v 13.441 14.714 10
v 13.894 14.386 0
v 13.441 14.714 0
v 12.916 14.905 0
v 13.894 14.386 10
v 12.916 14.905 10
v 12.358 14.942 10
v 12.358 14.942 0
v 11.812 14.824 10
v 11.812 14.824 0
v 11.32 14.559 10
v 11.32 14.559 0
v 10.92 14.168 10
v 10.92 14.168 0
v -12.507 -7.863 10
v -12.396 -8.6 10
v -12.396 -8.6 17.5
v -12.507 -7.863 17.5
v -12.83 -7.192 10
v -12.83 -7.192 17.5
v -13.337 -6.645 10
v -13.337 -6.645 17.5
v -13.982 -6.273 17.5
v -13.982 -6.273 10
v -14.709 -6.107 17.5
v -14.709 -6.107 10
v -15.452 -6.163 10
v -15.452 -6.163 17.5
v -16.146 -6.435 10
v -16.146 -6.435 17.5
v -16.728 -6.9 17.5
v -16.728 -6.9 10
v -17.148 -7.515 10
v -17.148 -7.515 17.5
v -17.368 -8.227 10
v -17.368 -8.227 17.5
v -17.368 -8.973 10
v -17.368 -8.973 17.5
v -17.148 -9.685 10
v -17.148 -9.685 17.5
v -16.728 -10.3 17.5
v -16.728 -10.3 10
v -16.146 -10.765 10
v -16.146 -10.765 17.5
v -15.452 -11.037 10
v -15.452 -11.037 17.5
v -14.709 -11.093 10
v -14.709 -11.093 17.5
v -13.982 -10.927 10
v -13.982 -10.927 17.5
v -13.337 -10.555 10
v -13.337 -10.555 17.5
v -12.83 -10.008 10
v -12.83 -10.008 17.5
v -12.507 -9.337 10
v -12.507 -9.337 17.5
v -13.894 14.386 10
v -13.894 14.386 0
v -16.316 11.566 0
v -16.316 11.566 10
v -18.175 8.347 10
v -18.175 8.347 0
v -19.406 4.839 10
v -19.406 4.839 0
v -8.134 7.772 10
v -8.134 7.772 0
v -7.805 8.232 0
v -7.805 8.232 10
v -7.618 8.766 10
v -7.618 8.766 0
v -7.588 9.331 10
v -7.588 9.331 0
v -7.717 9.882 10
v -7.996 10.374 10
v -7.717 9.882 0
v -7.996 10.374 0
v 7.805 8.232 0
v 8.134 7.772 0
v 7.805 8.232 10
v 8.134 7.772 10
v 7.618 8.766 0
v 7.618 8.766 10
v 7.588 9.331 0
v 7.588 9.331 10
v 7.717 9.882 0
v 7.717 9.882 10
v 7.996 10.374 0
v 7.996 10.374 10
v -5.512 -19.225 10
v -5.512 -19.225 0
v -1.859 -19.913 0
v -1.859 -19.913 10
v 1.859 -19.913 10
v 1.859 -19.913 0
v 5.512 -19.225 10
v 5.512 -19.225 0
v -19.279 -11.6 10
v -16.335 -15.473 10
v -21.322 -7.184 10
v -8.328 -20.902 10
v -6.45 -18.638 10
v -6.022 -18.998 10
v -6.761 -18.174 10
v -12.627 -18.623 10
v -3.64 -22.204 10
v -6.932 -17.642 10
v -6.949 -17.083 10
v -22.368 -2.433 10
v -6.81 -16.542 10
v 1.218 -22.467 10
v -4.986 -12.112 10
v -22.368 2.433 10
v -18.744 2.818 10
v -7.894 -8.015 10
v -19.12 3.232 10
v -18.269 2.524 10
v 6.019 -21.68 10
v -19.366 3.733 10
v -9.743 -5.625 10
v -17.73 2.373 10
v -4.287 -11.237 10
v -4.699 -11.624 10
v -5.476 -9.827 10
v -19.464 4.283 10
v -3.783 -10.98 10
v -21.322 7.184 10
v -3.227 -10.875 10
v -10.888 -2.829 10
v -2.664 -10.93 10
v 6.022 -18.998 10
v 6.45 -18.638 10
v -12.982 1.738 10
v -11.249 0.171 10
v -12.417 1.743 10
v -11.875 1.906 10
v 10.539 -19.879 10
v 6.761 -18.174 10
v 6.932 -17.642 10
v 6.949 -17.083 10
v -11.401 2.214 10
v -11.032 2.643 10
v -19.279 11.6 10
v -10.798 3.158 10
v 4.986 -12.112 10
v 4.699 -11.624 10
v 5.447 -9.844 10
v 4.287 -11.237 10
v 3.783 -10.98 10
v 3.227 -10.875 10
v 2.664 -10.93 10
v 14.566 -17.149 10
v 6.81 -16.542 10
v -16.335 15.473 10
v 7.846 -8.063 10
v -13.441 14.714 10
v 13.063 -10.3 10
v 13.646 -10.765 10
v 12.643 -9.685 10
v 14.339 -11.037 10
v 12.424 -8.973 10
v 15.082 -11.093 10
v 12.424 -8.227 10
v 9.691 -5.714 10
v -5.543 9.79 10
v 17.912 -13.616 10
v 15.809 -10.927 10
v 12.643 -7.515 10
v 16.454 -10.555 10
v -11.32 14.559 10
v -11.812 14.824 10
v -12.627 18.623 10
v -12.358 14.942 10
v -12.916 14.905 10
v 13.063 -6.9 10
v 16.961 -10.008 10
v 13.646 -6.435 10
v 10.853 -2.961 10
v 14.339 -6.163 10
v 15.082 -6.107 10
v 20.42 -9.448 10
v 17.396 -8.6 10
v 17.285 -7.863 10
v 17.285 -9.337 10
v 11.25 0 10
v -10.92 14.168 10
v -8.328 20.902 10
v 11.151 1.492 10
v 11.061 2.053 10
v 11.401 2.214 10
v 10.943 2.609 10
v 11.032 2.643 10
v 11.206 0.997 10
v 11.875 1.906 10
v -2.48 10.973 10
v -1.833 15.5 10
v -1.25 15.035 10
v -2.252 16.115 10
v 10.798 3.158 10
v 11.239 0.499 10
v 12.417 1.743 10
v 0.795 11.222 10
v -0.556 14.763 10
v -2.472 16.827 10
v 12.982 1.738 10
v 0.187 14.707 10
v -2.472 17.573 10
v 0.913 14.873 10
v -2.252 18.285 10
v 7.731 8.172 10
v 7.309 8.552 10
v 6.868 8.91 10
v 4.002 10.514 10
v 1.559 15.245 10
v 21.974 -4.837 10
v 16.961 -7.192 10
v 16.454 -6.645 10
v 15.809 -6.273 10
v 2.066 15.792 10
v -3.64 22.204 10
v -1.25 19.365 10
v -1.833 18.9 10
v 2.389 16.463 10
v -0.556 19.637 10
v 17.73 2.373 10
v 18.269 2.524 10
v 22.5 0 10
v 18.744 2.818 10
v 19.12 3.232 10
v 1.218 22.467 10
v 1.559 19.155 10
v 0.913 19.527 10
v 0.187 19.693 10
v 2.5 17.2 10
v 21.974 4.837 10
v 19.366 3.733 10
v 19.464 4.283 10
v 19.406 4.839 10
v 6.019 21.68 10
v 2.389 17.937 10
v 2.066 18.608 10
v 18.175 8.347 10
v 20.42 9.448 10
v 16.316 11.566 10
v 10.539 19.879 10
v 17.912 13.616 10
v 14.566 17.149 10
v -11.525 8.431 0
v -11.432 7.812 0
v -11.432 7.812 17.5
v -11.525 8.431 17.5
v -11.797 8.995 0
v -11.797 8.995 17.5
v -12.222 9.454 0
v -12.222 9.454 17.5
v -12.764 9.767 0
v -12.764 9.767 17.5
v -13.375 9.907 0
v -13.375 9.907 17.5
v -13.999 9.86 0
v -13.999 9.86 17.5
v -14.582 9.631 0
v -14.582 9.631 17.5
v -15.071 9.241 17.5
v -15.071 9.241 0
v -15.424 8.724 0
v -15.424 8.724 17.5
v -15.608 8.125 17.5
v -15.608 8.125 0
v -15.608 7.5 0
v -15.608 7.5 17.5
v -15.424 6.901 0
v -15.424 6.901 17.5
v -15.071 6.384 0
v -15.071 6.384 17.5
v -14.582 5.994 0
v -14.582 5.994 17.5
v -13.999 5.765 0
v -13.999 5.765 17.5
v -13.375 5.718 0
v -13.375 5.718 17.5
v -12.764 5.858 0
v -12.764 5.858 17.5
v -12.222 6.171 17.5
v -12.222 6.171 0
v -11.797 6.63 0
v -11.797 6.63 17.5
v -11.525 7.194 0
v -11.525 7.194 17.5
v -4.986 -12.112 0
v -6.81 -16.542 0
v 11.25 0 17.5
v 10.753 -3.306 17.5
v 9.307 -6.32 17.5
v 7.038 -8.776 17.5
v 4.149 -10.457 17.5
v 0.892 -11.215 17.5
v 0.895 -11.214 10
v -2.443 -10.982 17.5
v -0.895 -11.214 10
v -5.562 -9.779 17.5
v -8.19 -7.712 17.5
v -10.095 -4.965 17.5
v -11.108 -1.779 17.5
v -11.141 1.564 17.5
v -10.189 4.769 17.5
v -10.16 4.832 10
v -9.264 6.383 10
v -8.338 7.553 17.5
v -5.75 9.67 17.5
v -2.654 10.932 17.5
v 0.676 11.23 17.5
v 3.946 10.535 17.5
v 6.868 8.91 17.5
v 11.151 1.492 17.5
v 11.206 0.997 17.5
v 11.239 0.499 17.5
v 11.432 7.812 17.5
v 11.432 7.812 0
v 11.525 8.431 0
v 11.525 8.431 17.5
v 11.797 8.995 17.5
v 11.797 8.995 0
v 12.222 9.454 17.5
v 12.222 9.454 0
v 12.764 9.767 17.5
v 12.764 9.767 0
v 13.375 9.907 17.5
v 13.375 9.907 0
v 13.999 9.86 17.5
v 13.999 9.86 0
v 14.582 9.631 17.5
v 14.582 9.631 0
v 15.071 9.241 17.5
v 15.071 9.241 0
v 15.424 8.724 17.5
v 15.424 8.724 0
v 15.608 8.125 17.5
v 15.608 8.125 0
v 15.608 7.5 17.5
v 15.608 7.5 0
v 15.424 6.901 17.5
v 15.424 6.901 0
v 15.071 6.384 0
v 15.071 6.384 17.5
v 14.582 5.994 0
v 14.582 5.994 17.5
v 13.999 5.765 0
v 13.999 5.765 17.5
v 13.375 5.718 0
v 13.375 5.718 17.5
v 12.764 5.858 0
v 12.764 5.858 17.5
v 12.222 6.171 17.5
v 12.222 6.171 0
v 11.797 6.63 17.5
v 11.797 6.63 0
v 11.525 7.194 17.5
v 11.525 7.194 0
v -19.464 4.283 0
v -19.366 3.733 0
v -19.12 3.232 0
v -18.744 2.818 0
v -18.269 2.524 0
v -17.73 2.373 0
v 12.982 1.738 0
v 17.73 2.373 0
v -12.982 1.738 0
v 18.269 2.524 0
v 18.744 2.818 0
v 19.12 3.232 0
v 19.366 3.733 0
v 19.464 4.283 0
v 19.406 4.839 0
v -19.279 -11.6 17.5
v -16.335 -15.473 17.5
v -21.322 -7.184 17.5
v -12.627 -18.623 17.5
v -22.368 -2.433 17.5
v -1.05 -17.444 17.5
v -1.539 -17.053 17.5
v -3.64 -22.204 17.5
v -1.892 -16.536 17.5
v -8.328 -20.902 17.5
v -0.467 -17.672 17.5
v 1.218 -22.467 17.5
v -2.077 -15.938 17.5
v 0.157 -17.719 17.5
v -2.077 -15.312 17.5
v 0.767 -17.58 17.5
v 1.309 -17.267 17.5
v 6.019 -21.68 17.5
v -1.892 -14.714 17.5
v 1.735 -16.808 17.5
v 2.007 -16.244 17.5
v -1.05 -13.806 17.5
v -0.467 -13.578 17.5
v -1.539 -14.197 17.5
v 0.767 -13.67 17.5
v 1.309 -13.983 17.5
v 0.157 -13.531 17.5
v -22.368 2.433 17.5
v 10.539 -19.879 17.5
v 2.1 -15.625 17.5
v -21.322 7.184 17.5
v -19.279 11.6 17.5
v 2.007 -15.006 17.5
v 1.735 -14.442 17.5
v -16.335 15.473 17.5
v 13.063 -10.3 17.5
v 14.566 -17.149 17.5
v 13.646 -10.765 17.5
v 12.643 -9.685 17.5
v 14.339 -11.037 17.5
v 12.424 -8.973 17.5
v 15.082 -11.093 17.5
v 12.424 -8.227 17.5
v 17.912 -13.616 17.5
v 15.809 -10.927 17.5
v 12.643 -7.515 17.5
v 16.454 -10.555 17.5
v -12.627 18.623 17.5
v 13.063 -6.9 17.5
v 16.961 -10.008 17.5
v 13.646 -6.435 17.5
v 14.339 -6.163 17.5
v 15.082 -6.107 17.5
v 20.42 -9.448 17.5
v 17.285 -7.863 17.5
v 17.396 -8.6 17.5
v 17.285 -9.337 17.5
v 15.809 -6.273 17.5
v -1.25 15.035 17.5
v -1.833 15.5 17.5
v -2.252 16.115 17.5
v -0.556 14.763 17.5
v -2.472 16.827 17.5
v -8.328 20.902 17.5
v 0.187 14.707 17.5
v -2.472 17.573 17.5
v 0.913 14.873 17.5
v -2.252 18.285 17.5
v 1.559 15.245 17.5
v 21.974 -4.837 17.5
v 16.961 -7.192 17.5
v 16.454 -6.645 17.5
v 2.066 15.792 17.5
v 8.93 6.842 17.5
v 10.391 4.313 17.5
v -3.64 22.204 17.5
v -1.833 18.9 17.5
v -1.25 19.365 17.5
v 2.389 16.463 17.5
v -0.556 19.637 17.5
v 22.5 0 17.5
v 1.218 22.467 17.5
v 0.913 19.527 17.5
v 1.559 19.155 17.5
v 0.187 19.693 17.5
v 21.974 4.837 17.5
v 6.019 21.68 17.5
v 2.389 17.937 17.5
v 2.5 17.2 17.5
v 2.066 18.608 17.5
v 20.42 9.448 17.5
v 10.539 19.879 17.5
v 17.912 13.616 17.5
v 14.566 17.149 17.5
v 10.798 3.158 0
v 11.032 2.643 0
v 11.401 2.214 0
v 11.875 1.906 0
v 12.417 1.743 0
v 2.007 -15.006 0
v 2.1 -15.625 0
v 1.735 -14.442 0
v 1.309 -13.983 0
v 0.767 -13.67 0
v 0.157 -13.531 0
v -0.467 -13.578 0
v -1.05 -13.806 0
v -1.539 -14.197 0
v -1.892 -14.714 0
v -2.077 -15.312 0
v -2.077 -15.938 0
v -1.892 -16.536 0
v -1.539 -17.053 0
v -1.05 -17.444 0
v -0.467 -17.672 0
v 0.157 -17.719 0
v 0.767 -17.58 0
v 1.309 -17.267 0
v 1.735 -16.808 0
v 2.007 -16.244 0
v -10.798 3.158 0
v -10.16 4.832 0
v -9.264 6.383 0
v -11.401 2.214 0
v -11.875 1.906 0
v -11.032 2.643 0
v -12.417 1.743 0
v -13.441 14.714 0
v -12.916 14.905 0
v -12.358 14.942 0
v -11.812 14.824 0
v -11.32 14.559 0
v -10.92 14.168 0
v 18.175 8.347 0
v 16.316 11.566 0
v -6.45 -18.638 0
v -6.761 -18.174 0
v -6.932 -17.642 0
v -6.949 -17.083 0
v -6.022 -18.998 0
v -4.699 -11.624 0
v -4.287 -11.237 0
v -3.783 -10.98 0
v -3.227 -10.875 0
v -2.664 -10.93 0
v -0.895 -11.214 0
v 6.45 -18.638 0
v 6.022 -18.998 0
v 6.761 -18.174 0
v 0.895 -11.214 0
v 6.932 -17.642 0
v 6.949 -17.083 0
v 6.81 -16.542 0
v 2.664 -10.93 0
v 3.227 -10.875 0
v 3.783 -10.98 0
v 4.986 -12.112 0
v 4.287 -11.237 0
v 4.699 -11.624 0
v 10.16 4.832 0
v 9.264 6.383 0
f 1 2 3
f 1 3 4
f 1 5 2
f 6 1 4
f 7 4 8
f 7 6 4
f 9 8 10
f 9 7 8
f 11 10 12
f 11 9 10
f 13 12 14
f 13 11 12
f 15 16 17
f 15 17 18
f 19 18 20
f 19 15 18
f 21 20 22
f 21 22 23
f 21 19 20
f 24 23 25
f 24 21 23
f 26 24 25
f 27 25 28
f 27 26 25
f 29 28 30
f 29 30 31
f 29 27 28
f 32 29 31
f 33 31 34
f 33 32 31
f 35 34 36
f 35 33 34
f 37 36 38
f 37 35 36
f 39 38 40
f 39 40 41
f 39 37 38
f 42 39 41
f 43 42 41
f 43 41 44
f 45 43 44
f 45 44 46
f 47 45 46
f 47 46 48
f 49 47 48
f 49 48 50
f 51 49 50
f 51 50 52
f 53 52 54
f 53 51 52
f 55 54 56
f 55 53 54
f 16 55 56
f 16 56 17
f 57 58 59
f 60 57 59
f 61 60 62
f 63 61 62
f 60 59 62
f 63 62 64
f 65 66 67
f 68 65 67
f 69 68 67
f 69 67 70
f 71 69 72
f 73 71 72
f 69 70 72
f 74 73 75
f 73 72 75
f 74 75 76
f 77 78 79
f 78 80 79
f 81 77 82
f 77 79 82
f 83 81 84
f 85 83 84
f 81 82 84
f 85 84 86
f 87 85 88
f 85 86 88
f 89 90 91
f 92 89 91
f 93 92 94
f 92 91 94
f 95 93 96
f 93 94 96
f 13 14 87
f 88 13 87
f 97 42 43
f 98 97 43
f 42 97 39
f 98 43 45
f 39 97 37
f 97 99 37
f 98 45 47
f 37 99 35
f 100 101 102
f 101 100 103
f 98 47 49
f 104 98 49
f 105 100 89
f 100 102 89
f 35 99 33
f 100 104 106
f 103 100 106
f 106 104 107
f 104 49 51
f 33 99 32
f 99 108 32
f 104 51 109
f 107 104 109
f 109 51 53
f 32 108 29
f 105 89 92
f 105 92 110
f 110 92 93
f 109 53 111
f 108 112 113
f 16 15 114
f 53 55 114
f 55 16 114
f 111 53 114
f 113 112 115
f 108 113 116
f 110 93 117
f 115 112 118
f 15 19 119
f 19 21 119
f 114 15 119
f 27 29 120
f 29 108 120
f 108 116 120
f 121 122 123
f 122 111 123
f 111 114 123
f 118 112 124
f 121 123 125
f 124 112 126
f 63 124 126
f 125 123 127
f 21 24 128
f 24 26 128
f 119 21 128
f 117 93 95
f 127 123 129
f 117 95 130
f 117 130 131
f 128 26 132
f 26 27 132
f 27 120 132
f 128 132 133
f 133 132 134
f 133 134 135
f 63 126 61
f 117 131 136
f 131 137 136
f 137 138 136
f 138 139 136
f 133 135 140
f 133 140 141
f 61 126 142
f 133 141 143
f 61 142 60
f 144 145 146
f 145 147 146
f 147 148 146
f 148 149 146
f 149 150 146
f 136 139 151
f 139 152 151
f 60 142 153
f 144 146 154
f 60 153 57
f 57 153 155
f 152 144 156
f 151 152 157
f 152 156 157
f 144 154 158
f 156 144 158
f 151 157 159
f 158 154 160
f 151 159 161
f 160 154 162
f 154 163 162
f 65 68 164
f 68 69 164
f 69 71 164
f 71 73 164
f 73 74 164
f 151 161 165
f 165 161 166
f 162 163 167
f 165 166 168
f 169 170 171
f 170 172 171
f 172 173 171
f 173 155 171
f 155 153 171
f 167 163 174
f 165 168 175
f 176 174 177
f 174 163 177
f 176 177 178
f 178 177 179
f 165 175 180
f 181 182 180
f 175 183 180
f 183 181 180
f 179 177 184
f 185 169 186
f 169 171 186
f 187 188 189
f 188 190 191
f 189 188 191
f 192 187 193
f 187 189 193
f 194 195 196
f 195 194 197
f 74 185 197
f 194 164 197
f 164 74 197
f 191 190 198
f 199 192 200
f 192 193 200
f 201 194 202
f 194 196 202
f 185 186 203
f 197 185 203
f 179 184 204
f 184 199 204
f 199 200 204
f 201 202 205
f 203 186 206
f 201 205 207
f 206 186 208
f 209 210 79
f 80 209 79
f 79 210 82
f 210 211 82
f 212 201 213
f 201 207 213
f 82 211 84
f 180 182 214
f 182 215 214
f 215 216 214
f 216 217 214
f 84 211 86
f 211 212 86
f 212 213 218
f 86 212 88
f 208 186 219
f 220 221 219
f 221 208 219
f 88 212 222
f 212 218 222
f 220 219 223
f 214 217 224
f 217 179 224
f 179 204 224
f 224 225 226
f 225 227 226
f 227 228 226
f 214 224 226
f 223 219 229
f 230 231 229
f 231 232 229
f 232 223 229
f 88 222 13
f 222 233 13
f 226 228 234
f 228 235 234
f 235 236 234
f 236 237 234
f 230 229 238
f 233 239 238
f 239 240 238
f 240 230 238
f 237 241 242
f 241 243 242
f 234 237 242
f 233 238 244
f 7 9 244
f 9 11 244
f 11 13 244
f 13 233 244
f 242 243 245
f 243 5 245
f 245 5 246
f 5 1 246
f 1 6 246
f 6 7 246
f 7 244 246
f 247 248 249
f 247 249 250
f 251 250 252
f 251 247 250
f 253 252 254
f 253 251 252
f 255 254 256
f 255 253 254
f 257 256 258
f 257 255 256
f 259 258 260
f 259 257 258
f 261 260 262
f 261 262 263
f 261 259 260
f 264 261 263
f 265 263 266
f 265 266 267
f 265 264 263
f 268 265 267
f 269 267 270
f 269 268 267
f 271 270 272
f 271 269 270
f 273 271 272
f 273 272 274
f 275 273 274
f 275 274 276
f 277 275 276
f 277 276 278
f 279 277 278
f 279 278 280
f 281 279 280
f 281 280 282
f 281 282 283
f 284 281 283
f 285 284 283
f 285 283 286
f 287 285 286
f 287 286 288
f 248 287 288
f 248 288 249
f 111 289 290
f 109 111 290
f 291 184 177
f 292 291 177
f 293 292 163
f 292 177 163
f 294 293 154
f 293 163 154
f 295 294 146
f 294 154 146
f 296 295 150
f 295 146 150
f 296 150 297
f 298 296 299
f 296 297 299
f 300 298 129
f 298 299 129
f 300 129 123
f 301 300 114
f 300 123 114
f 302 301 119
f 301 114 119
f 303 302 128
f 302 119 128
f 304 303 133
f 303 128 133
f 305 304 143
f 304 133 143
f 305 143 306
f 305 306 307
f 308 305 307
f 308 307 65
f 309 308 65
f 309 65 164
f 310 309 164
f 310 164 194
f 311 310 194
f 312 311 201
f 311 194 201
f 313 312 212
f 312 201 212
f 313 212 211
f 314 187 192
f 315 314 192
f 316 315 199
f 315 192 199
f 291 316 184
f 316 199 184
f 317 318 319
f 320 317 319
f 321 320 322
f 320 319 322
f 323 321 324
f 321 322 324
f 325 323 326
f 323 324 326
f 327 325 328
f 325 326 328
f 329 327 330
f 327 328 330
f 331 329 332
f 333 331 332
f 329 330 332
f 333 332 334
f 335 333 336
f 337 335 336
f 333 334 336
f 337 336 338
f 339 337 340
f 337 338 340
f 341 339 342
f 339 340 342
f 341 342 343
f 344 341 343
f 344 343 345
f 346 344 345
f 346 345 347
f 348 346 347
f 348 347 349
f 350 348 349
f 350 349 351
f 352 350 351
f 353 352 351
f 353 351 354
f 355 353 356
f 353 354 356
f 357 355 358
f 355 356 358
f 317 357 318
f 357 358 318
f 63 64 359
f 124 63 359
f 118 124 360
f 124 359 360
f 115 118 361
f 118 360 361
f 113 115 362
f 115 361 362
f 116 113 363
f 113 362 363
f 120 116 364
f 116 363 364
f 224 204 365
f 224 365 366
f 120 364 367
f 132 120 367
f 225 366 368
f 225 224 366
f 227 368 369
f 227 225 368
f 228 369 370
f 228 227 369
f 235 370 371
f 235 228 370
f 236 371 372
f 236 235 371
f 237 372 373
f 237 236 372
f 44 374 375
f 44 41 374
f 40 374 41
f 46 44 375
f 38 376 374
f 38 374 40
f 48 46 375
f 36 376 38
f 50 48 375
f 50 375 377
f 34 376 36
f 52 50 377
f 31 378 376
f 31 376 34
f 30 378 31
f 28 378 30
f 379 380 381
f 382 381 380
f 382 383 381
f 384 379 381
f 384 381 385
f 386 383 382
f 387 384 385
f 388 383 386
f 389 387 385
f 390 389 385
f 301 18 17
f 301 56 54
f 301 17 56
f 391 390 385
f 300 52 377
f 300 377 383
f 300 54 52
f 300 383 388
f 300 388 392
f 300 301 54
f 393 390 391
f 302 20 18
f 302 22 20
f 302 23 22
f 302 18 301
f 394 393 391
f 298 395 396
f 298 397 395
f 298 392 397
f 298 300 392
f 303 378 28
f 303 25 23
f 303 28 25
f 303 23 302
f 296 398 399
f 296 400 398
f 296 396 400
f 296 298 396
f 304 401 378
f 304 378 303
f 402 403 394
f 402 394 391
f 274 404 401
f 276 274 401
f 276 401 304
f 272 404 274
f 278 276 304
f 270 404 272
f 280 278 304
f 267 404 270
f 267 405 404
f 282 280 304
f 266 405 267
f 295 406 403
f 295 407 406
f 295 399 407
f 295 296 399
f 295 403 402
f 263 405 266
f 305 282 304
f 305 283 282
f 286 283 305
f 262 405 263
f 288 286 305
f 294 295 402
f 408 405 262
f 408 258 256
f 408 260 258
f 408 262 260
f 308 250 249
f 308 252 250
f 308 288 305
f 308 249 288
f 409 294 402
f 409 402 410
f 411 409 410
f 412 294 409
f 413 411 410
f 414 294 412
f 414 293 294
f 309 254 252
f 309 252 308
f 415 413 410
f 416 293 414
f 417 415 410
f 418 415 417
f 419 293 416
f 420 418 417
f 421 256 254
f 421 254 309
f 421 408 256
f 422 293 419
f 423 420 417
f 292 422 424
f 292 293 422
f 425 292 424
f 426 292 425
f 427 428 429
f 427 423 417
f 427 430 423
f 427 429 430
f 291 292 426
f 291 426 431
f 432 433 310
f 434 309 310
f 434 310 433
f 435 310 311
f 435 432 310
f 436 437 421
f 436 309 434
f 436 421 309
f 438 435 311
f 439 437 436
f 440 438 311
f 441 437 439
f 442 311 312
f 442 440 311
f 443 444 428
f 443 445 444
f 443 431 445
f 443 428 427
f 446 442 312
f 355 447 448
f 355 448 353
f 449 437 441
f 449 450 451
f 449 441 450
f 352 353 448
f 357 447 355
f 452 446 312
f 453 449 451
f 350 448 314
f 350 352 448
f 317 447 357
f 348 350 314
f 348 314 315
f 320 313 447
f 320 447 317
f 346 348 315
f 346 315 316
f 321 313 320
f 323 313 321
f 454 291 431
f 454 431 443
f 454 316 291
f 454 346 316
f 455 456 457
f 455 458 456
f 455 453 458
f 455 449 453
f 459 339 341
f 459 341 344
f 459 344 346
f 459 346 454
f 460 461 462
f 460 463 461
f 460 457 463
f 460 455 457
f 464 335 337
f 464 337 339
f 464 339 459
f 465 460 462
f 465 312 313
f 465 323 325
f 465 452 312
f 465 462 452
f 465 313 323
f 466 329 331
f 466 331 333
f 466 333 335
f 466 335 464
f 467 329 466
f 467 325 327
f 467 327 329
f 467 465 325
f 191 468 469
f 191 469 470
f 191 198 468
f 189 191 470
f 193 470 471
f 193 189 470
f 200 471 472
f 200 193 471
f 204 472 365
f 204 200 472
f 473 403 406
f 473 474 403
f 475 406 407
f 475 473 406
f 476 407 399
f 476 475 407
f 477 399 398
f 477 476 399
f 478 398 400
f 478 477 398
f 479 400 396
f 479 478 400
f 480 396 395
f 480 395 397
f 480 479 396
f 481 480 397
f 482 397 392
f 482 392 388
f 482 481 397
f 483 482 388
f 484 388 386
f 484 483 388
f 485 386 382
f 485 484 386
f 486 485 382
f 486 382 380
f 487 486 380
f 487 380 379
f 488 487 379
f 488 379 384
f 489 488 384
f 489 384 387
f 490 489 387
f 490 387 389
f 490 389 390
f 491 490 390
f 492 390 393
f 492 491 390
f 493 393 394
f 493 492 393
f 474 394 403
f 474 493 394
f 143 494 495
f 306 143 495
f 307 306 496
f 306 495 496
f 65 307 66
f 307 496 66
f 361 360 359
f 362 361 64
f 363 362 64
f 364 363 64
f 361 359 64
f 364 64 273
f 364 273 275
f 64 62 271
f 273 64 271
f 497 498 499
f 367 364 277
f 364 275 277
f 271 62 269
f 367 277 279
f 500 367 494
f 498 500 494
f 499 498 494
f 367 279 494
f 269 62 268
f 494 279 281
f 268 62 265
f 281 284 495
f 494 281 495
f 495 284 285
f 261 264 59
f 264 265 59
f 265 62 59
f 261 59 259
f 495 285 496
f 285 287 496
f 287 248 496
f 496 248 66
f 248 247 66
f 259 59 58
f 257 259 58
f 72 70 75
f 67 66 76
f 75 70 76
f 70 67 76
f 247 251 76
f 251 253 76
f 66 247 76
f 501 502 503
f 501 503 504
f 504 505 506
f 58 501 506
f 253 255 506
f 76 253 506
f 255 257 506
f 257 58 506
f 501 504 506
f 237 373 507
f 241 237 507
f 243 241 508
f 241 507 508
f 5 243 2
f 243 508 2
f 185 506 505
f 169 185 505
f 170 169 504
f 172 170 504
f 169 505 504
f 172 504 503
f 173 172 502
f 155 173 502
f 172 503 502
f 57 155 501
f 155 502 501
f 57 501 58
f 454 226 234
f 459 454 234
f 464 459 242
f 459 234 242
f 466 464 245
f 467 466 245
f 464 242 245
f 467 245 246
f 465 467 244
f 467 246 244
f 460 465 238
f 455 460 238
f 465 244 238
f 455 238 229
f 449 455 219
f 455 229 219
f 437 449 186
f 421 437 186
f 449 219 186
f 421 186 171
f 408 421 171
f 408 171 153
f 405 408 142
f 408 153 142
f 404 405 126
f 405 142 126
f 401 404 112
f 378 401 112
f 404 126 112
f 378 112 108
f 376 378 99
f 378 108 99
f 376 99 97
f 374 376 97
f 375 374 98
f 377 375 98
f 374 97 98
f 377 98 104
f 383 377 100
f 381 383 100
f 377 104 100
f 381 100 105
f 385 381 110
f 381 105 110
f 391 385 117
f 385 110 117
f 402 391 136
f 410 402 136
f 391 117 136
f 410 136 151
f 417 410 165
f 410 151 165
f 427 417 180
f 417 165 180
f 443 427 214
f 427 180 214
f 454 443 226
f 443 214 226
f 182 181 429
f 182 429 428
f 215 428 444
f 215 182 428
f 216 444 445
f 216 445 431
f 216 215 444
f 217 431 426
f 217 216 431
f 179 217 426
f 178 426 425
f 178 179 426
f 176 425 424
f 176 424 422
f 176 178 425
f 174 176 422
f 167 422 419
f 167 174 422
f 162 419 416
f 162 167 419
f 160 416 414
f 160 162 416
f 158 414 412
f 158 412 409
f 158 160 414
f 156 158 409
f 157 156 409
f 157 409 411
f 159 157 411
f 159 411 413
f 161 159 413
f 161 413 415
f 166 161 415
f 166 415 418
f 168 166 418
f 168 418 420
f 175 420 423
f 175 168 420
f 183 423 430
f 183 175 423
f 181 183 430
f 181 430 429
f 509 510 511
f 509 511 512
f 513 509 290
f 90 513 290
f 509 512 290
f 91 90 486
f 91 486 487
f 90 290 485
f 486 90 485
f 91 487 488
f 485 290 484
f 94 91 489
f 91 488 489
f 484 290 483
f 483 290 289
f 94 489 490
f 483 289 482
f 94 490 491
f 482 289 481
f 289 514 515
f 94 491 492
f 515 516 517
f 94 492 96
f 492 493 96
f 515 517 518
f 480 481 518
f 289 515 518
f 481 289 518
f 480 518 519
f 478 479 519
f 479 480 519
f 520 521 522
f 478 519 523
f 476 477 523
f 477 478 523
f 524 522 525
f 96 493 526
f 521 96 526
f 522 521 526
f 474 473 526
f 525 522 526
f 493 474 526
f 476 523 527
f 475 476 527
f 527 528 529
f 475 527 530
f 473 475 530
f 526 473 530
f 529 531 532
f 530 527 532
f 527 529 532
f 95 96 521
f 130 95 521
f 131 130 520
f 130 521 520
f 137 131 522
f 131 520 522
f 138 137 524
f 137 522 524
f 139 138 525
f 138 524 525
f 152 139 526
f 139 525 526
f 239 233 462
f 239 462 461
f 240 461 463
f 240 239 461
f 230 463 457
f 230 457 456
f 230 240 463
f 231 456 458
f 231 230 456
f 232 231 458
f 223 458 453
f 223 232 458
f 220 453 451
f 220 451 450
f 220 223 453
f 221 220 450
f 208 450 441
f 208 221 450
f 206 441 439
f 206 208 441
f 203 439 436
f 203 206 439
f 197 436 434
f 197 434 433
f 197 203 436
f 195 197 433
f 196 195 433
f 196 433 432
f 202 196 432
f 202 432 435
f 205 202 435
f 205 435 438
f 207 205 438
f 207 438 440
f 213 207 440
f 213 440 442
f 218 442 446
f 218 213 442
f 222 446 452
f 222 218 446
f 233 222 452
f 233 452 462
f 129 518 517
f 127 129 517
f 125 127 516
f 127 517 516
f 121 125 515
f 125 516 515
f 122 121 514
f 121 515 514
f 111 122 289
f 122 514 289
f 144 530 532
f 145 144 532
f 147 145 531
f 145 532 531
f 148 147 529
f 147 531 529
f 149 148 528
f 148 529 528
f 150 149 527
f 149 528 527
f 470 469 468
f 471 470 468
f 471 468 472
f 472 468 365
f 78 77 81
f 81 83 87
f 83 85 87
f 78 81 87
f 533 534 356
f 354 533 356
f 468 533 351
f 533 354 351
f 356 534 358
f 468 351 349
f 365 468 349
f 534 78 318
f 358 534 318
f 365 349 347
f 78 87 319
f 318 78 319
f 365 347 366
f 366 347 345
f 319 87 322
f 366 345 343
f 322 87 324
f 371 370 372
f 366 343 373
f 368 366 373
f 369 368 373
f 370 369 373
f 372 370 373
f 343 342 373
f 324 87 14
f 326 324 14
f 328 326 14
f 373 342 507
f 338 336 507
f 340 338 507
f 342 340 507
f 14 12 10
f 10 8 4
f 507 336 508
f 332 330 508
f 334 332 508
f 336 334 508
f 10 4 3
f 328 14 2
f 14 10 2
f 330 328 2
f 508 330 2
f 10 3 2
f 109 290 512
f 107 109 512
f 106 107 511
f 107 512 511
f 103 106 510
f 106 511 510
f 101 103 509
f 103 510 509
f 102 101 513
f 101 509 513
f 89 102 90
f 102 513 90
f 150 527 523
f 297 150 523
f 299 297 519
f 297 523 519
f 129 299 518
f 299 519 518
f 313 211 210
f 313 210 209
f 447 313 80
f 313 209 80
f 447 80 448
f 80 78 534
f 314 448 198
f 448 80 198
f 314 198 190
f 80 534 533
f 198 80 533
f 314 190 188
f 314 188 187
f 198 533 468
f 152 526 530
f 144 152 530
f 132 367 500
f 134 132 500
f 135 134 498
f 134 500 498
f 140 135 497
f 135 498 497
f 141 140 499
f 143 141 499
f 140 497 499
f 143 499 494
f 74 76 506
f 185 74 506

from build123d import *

# Parameters (mm, degrees)
BOSS_EXTRUDE1_DEPTH     = 10
FILLET1_R               = 2
BOSS_EXTRUDE2_START     = 10
SKETCH1_3_R             = 22.5
SKETCH1_3_R_2           = 20
SKETCH1_3_R_3           = 2.5
BOSS_EXTRUDE2_DEPTH     = 7.5
SKETCH2_R               = 2.1
CUT_EXTRUDE2_DEPTH      = 17.5
CIRPATTERN1_START       = 10
CIRPATTERN1_OUTLINE_R   = 2.1
CIRPATTERN1_DEPTH       = 7.5
CIRPATTERN1_2_OUTLINE_R = 2.1
CIRPATTERN1_2_DEPTH     = 10


# Read off the part's stored shape, not the designer's step: CirPattern1
with BuildPart() as part:
    # Sketch1 → Boss-Extrude1 (new body)
    with BuildSketch(Plane.XY):
        with BuildLine():
            ThreePointArc((6.867732558, 8.910485369), (9.742785793, 5.625), (11.150572969, 1.492388177))
            Line((11.150572969, 1.492388177), (19.823240833, 2.653134537))
            ThreePointArc((19.823240833, 2.653134537), (17.320508076, 10), (12.209302326, 15.840862878))
            Line((12.209302326, 15.840862878), (6.867732558, 8.910485369))
        make_face()
    extrude(amount=BOSS_EXTRUDE1_DEPTH)

    # Fillet1
    fillet1_edges = [part.edges().sort_by_distance(p)[0] for p in [
        (11.150572969, 1.492388177, 5),
        (6.867732558, 8.910485369, 5),
        (12.209302326, 15.840862878, 5),
        (19.823240833, 2.653134537, 5),
    ]]
    fillet(fillet1_edges, radius=FILLET1_R)

    # Sketch1<3> → Boss-Extrude2 (add)
    # profile 1 of 3: a face of its own
    with BuildSketch(Plane.XY.offset(BOSS_EXTRUDE2_START)):
        Circle(SKETCH1_3_R)
        Circle(SKETCH1_3_R_2, mode=Mode.SUBTRACT)
    # profile 2 of 3: a face of its own
    with BuildSketch(Plane.XY.offset(BOSS_EXTRUDE2_START)):
        with BuildLine():
            Line((19.823240833, 2.653134537), (11.150572969, 1.492388177))
            ThreePointArc((11.150572969, 1.492388177), (11.225115721, 0.747848281), (11.25, 0))
            ThreePointArc((11.25, 0), (-10.095159515, -4.964902251), (6.867732558, 8.910485369))
            Line((6.867732558, 8.910485369), (12.209302326, 15.840862878))
            ThreePointArc((12.209302326, 15.840862878), (-17.946950249, -8.82649289), (20, 0))
            ThreePointArc((20, 0), (19.955761282, 1.329508055), (19.823240833, 2.653134537))
        make_face()
        with Locations((-14.895636945, -8.6)):
            Circle(SKETCH1_3_R_3, mode=Mode.SUBTRACT)
        with Locations((14.895636945, -8.6)):
            Circle(SKETCH1_3_R_3, mode=Mode.SUBTRACT)
        with Locations((0, 17.2)):
            Circle(SKETCH1_3_R_3, mode=Mode.SUBTRACT)
    # profile 3 of 3: a face of its own
    with BuildSketch(Plane.XY.offset(BOSS_EXTRUDE2_START)):
        with BuildLine():
            ThreePointArc((6.867732558, 8.910485369), (9.742785793, 5.625), (11.150572969, 1.492388177))
            Line((11.150572969, 1.492388177), (19.823240833, 2.653134537))
            ThreePointArc((19.823240833, 2.653134537), (17.320508076, 10), (12.209302326, 15.840862878))
            Line((12.209302326, 15.840862878), (6.867732558, 8.910485369))
        make_face()
    extrude(amount=BOSS_EXTRUDE2_DEPTH)

    # Sketch2 → Cut-Extrude2 (cut)
    with BuildSketch(Plane(origin=(0, 0, 0), x_dir=(-1, 0, 0), z_dir=(0, 0, -1))):
        with Locations((-13.531646934, 7.8125)):
            Circle(SKETCH2_R)
    extrude(amount=-CUT_EXTRUDE2_DEPTH, mode=Mode.SUBTRACT)

    # CirPattern1 outline → CirPattern1 (cut)
    with BuildSketch(Plane.XY.offset(CIRPATTERN1_START)):
        with Locations((0, -15.625)):
            Circle(CIRPATTERN1_OUTLINE_R)
        with Locations((-13.531646934, 7.8125)):
            Circle(CIRPATTERN1_OUTLINE_R)
    extrude(amount=CIRPATTERN1_DEPTH, mode=Mode.SUBTRACT)

    # CirPattern1 2 outline → CirPattern1 2 (add)
    # profile 1 of 2: a face of its own
    with BuildSketch(Plane.XY):
        with BuildLine():
            ThreePointArc((-13.893798079, 14.386186949), (-17.320508076, 10), (-19.405702401, 4.839288617))
            ThreePointArc((-19.405702401, 4.839288617), (-19.119544932, 3.231563339), (-17.730445615, 2.373035672))
            Line((-17.730445615, 2.373035672), (-12.982425667, 1.737562602))
            ThreePointArc((-12.982425667, 1.737562602), (-11.626778767, 2.043231391), (-10.797548106, 3.158394355))
            ThreePointArc((-10.797548106, 3.158394355), (-9.742785793, 5.625), (-8.1340238, 7.771753781))
            ThreePointArc((-8.1340238, 7.771753781), (-7.582879674, 9.047470081), (-7.995986187, 10.37432913))
            Line((-7.995986187, 10.37432913), (-10.920331983, 14.168498487))
            ThreePointArc((-10.920331983, 14.168498487), (-12.358388411, 14.94222995), (-13.893798079, 14.386186949))
        make_face()
        with Locations((-13.531646934, 7.8125)):
            Circle(CIRPATTERN1_2_OUTLINE_R, mode=Mode.SUBTRACT)
    # profile 2 of 2: a face of its own
    with BuildSketch(Plane.XY):
        with BuildLine():
            ThreePointArc((2.663524306, -10.930148136), (0, -11.25), (-2.663524306, -10.930148136))
            ThreePointArc((-2.663524306, -10.930148136), (-4.043899093, -11.090701472), (-4.98643948, -12.111891731))
            Line((-4.98643948, -12.111891731), (-6.810113632, -16.541534159))
            ThreePointArc((-6.810113632, -16.541534159), (-6.761156521, -18.173793289), (-5.511904322, -19.225475566))
            ThreePointArc((-5.511904322, -19.225475566), (0, -20), (5.511904322, -19.225475566))
            ThreePointArc((5.511904322, -19.225475566), (6.761156521, -18.173793289), (6.810113632, -16.541534159))
            Line((6.810113632, -16.541534159), (4.98643948, -12.111891731))
            ThreePointArc((4.98643948, -12.111891731), (4.043899093, -11.090701472), (2.663524306, -10.930148136))
        make_face()
        with Locations((0, -15.625)):
            Circle(CIRPATTERN1_2_OUTLINE_R, mode=Mode.SUBTRACT)
    extrude(amount=CIRPATTERN1_2_DEPTH)


solid = part.part
